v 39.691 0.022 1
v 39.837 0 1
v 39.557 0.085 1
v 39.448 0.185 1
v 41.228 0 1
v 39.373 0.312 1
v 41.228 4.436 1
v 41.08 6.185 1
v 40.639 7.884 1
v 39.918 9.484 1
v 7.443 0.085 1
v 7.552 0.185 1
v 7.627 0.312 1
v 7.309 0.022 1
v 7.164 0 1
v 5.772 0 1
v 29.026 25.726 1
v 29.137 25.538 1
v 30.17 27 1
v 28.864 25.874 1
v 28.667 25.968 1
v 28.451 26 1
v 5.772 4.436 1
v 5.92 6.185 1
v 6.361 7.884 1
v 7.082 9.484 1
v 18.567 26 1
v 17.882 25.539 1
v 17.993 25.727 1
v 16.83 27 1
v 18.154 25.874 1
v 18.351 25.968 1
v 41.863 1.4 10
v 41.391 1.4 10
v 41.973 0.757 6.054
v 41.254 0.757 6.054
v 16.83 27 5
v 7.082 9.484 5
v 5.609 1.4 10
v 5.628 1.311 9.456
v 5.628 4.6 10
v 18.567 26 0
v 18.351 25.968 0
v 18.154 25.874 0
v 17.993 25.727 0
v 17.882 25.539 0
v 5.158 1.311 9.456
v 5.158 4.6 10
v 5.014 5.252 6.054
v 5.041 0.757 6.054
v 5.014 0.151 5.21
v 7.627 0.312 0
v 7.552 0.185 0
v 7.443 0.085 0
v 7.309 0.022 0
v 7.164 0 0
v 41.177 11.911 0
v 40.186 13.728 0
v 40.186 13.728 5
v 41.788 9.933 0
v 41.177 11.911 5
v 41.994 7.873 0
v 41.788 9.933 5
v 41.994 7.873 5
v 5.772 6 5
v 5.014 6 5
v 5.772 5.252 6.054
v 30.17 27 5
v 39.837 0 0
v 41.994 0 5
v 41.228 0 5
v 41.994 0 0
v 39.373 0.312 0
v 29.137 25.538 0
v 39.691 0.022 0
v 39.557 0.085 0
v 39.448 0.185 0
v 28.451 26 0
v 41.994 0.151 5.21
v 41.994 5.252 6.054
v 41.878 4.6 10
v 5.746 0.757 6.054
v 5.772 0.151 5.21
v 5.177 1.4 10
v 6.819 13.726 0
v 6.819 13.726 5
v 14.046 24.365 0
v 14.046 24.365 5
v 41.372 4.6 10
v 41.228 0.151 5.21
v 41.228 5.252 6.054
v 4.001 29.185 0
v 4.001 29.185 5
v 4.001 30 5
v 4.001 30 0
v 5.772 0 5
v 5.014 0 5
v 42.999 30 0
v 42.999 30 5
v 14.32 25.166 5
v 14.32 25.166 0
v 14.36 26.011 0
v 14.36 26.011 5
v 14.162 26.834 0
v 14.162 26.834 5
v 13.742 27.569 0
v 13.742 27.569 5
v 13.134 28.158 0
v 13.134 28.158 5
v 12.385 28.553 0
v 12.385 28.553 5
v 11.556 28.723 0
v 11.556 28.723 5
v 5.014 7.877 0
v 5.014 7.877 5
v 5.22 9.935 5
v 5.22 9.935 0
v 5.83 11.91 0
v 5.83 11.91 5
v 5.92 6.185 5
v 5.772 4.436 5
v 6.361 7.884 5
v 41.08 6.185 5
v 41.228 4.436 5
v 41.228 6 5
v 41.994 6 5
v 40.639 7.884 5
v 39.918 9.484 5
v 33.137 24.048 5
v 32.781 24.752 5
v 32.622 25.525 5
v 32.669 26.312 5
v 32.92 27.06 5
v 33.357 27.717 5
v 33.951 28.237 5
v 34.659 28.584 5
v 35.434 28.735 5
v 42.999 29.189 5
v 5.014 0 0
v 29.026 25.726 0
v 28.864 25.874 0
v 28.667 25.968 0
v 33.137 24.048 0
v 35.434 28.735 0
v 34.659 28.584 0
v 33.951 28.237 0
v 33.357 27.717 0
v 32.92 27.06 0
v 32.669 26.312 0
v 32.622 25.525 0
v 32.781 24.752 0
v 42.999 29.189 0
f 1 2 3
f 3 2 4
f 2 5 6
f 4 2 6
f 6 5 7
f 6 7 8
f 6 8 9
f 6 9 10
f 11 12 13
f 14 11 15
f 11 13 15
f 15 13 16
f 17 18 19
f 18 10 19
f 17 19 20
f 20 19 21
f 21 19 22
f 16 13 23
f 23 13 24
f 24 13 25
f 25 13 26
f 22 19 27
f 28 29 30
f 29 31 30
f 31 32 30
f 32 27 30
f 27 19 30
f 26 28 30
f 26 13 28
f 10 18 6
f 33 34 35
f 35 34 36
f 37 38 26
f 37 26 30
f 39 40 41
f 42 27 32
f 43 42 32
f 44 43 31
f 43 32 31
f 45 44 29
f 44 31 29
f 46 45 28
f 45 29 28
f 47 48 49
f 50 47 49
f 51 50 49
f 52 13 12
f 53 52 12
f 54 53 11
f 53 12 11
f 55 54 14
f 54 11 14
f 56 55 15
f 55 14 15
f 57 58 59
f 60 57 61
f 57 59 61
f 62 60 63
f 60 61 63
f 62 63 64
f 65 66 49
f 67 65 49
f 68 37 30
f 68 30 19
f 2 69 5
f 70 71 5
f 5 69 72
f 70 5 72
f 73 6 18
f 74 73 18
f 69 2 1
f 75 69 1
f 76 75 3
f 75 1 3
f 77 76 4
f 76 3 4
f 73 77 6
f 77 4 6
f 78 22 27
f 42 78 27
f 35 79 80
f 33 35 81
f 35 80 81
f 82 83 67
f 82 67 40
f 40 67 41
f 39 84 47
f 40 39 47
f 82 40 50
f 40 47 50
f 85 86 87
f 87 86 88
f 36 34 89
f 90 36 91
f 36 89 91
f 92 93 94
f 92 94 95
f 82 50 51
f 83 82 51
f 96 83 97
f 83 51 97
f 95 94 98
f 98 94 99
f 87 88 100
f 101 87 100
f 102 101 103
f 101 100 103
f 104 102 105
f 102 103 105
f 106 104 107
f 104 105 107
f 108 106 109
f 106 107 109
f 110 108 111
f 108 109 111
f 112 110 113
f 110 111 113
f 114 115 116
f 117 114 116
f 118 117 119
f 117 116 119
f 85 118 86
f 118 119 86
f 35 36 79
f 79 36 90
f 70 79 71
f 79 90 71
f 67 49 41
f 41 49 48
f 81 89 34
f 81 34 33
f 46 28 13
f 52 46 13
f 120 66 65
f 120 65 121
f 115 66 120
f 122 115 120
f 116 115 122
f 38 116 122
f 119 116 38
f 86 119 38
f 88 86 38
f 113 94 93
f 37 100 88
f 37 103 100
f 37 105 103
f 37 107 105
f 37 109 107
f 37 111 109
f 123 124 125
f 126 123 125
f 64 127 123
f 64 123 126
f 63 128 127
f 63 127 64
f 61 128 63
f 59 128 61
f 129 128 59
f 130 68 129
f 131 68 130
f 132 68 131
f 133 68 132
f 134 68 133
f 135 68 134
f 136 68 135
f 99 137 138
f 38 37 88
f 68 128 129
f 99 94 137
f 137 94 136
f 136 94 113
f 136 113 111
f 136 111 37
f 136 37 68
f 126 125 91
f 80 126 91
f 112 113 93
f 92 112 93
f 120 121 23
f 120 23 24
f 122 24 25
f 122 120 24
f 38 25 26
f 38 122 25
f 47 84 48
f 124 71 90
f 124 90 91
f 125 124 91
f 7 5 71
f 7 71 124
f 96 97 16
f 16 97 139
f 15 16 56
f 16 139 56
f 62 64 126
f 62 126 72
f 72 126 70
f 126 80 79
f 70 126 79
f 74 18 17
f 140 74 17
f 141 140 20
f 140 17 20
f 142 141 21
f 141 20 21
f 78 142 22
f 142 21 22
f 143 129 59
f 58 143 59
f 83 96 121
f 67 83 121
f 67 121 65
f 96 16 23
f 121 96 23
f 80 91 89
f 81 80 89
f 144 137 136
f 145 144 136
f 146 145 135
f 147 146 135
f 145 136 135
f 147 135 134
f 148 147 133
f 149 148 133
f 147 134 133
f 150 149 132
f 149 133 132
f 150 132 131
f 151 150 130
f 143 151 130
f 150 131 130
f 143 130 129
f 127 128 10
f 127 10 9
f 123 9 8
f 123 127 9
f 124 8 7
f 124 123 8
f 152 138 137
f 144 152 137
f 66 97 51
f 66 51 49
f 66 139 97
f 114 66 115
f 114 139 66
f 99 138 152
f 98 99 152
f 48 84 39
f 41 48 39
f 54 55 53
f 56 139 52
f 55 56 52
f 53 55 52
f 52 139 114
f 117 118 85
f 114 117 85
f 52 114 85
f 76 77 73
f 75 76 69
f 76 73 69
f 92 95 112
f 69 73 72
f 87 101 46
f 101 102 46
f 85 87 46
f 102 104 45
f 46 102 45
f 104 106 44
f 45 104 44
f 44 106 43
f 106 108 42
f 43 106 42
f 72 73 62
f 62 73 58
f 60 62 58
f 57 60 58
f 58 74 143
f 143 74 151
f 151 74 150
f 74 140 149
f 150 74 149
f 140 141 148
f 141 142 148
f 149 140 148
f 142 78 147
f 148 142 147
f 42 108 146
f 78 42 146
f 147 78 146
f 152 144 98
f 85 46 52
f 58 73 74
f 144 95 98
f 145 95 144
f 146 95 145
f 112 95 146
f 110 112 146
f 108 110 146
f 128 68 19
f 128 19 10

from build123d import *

# Parameters (mm, degrees)
SKETCH_1_W               = 47
SKETCH_1_H               = 32
EXTRUDE_1_DEPTH          = 5
CUT_EXTRUDE_1_DEPTH      = 58.078892771
CUT_EXTRUDE_5_DEPTH      = 4
CUT_EXTRUDE_6_DEPTH      = 58.078892771
SKETCH_5_W               = 0.757642216
SKETCH_5_H               = 6
SKETCH_5_W_2             = 0.766357784
EXTRUDE_2_DEPTH          = 5
CUT_EXTRUDE_7_DEPTH      = 54.728894948
CUT_EXTRUDE_8_DEPTH      = 55.418489547
SKETCH_8_W               = 47
SKETCH_8_H               = 2
CUT_EXTRUDE_9_DEPTH      = 10
CUT_EXTRUDE_START        = -0.814789408
CUT_EXTRUDE_10_OUTLINE_W = 4.001231447
CUT_EXTRUDE_10_OUTLINE_H = 5
CUT_EXTRUDE_10_DEPTH     = 0.814789408


# Read off the part's stored shape, not the designer's step: 切除-拉伸10
with BuildPart() as part:
    # 草图1 → 凸台-拉伸1 (new body)
    with BuildSketch(Plane.XY):
        with Locations((23.5, 16)):
            Rectangle(SKETCH_1_W, SKETCH_1_H)
    extrude(amount=EXTRUDE_1_DEPTH)

    # 草图2 → 切除-拉伸1 (cut, through all)
    with BuildSketch(Plane.XY.offset(5)):
        with BuildLine():
            Line((23.5, 0), (23.5, 26))
            Line((23.5, 26), (18.566996488, 26))
            ThreePointArc((18.566996488, 26), (18.15387041, 25.873934732), (17.881511675, 25.538694031))
            Line((17.881511675, 25.538694031), (7.626711155, 0.31171158))
            ThreePointArc((7.626711155, 0.31171158), (7.442674144, 0.085184252), (7.163518462, 0))
            Line((7.163518462, 0), (7.5, 0))
            Line((7.5, 0), (23.5, 0))
        make_face()
        with BuildLine():
            Line((28.45115486, 26), (23.5, 26))
            Line((23.5, 26), (23.5, 0))
            Line((23.5, 0), (39.5, 0))
            Line((39.5, 0), (39.836703186, 0))
            ThreePointArc((39.836703186, 0), (39.557420976, 0.085269428), (39.373395704, 0.311994211))
            Line((39.373395704, 0.311994211), (29.136809551, 25.538275761))
            ThreePointArc((29.136809551, 25.538275761), (28.864468188, 25.873808678), (28.45115486, 26))
        make_face()
    extrude(amount=-CUT_EXTRUDE_1_DEPTH, mode=Mode.SUBTRACT)

    # 草图3 → 切除-拉伸5 (cut)
    with BuildSketch(Plane.XY.offset(5)):
        with BuildLine():
            Line((28.45115486, 26), (18.566996488, 26))
            add(Edge.make_bspline(
                [(18.566996488, 26), (18.083486738, 25.978522449), (17.881511675, 25.538694031)],
                knots=[0, 0, 0, 1, 1, 1], degree=2))
            Line((17.881511675, 25.538694031), (7.614040039, 0.280540422))
            ThreePointArc((7.614040039, 0.280540422), (7.448406729, 0.076665827), (7.197166615, 0))
            Line((7.197166615, 0), (5.772, 0))
            Line((5.772, 0), (5.772, 4.436119664))
            ThreePointArc((5.772, 4.436119664), (6.104843669, 7.043618399), (7.082028835, 9.483893735))
            Line((7.082028835, 9.483893735), (16.830389156, 27))
            Line((16.830389156, 27), (30.169610844, 27))
            Line((30.169610844, 27), (39.917971165, 9.483893735))
            ThreePointArc((39.917971165, 9.483893735), (40.895156331, 7.043618399), (41.228, 4.436119664))
            Line((41.228, 4.436119664), (41.228, 0))
            Line((41.228, 0), (39.803032868, 0))
            ThreePointArc((39.803032868, 0), (39.551678879, 0.076742485), (39.386056133, 0.28079479))
            Line((39.386056133, 0.28079479), (29.136809551, 25.538275761))
            add(Edge.make_bspline(
                [(28.45115486, 26), (28.93495417, 25.978479476), (29.136809551, 25.538275761)],
                knots=[0, 0, 0, 1, 1, 1], degree=2))
        make_face()
    extrude(amount=-CUT_EXTRUDE_5_DEPTH, mode=Mode.SUBTRACT)

    # 草图4 → 切除-拉伸6 (cut, through all)
    with BuildSketch(Plane.XY.offset(5)):
        with BuildLine():
            Line((0, 0), (5.014357784, 0))
            Line((5.014357784, 0), (5.014357784, 7.877425761))
            ThreePointArc((5.014357784, 7.877425761), (5.475718856, 10.937654809), (6.818789734, 13.72584714))
            Line((6.818789734, 13.72584714), (14.045555305, 24.365213617))
            ThreePointArc((14.045555305, 24.365213617), (13.978253194, 27.216535436), (11.556446219, 28.722993754))
            Line((11.556446219, 28.722993754), (0, 29.43))
            Line((0, 29.43), (0, 0))
        make_face()
        with BuildLine():
            Line((41.994357784, 7.873314412), (41.994357784, 0))
            Line((41.994357784, 0), (47, 0))
            Line((47, 0), (47, 29.43))
            Line((47, 29.43), (35.433873083, 28.73462187))
            ThreePointArc((35.433873083, 28.73462187), (32.920113477, 27.060422918), (33.13664909, 24.047941912))
            Line((33.13664909, 24.047941912), (40.185693822, 13.727936391))
            ThreePointArc((40.185693822, 13.727936391), (41.531889434, 10.937130001), (41.994357784, 7.873314412))
        make_face()
    extrude(amount=-CUT_EXTRUDE_6_DEPTH, mode=Mode.SUBTRACT)

    # 草图5 → 凸台-拉伸2 (add)
    with BuildSketch(Plane.XY.offset(5)):
        with Locations((5.393178892, 3)):
            Rectangle(SKETCH_5_W, SKETCH_5_H)
        with Locations((41.611178892, 3)):
            Rectangle(SKETCH_5_W_2, SKETCH_5_H)
    extrude(amount=EXTRUDE_2_DEPTH)

    # 草图6 → 切除-拉伸7 (cut, through all)
    with BuildSketch(Plane.ZY.offset(-5.014357784)):
        Polygon((6.053573934, 5.25247322), (10, 4.6), (10, 6), (5, 6), align=None)
        Polygon((10, 0), (10, 1.4), (6.053573934, 0.757008468), (5, 0), align=None)
    extrude(amount=-CUT_EXTRUDE_7_DEPTH, mode=Mode.SUBTRACT)

    # 草图7 → 切除-拉伸8 (cut, through all)
    with BuildSketch(Plane(origin=(0, 6.086940952, 1.006370294), x_dir=(1, 0, 0), z_dir=(0, 0.9866065166041178, 0.16311830490257262))):
        Polygon((5.1771781, -9.637699539), (5.158383514, -9.115720963), (5.014357784, -9.115720963), (5.014357784, -9.637699539), align=None)
        Polygon((5.158383514, -9.115720963), (5.014357784, -5.115720963), (5.014357784, -9.115720963), align=None)
        Polygon((5.772, -9.115720963), (5.772, -5.115720963), (5.627806352, -9.115720963), align=None)
        Polygon((5.772, -9.115720963), (5.627806352, -9.115720963), (5.608989853, -9.637699539), (5.772, -9.637699539), align=None)
        Polygon((41.994357784, -9.637699539), (41.994357784, -5.115720963), (41.862646969, -9.637699539), align=None)
        Polygon((41.390820316, -9.637699539), (41.228, -5.115720963), (41.228, -9.637699539), align=None)
    extrude(amount=-CUT_EXTRUDE_8_DEPTH, mode=Mode.SUBTRACT)

    # 草图8 → 切除-拉伸9 (cut)
    with BuildSketch(Plane.XY.offset(5)):
        with Locations((23.5, 31)):
            Rectangle(SKETCH_8_W, SKETCH_8_H)
    extrude(amount=-CUT_EXTRUDE_9_DEPTH, mode=Mode.SUBTRACT)

    # 切除-拉伸10 outline → 切除-拉伸10 (cut)
    with BuildSketch(Plane(origin=(0, 30, 0), x_dir=(1, 0, 0), z_dir=(0, 1, 0)).offset(CUT_EXTRUDE_START)):
        with Locations((2.000615724, -2.5)):
            Rectangle(CUT_EXTRUDE_10_OUTLINE_W, CUT_EXTRUDE_10_OUTLINE_H)
        with Locations((44.999384277, -2.5)):
            Rectangle(CUT_EXTRUDE_10_OUTLINE_W, CUT_EXTRUDE_10_OUTLINE_H)
    extrude(amount=CUT_EXTRUDE_10_DEPTH, mode=Mode.SUBTRACT)


solid = part.part
